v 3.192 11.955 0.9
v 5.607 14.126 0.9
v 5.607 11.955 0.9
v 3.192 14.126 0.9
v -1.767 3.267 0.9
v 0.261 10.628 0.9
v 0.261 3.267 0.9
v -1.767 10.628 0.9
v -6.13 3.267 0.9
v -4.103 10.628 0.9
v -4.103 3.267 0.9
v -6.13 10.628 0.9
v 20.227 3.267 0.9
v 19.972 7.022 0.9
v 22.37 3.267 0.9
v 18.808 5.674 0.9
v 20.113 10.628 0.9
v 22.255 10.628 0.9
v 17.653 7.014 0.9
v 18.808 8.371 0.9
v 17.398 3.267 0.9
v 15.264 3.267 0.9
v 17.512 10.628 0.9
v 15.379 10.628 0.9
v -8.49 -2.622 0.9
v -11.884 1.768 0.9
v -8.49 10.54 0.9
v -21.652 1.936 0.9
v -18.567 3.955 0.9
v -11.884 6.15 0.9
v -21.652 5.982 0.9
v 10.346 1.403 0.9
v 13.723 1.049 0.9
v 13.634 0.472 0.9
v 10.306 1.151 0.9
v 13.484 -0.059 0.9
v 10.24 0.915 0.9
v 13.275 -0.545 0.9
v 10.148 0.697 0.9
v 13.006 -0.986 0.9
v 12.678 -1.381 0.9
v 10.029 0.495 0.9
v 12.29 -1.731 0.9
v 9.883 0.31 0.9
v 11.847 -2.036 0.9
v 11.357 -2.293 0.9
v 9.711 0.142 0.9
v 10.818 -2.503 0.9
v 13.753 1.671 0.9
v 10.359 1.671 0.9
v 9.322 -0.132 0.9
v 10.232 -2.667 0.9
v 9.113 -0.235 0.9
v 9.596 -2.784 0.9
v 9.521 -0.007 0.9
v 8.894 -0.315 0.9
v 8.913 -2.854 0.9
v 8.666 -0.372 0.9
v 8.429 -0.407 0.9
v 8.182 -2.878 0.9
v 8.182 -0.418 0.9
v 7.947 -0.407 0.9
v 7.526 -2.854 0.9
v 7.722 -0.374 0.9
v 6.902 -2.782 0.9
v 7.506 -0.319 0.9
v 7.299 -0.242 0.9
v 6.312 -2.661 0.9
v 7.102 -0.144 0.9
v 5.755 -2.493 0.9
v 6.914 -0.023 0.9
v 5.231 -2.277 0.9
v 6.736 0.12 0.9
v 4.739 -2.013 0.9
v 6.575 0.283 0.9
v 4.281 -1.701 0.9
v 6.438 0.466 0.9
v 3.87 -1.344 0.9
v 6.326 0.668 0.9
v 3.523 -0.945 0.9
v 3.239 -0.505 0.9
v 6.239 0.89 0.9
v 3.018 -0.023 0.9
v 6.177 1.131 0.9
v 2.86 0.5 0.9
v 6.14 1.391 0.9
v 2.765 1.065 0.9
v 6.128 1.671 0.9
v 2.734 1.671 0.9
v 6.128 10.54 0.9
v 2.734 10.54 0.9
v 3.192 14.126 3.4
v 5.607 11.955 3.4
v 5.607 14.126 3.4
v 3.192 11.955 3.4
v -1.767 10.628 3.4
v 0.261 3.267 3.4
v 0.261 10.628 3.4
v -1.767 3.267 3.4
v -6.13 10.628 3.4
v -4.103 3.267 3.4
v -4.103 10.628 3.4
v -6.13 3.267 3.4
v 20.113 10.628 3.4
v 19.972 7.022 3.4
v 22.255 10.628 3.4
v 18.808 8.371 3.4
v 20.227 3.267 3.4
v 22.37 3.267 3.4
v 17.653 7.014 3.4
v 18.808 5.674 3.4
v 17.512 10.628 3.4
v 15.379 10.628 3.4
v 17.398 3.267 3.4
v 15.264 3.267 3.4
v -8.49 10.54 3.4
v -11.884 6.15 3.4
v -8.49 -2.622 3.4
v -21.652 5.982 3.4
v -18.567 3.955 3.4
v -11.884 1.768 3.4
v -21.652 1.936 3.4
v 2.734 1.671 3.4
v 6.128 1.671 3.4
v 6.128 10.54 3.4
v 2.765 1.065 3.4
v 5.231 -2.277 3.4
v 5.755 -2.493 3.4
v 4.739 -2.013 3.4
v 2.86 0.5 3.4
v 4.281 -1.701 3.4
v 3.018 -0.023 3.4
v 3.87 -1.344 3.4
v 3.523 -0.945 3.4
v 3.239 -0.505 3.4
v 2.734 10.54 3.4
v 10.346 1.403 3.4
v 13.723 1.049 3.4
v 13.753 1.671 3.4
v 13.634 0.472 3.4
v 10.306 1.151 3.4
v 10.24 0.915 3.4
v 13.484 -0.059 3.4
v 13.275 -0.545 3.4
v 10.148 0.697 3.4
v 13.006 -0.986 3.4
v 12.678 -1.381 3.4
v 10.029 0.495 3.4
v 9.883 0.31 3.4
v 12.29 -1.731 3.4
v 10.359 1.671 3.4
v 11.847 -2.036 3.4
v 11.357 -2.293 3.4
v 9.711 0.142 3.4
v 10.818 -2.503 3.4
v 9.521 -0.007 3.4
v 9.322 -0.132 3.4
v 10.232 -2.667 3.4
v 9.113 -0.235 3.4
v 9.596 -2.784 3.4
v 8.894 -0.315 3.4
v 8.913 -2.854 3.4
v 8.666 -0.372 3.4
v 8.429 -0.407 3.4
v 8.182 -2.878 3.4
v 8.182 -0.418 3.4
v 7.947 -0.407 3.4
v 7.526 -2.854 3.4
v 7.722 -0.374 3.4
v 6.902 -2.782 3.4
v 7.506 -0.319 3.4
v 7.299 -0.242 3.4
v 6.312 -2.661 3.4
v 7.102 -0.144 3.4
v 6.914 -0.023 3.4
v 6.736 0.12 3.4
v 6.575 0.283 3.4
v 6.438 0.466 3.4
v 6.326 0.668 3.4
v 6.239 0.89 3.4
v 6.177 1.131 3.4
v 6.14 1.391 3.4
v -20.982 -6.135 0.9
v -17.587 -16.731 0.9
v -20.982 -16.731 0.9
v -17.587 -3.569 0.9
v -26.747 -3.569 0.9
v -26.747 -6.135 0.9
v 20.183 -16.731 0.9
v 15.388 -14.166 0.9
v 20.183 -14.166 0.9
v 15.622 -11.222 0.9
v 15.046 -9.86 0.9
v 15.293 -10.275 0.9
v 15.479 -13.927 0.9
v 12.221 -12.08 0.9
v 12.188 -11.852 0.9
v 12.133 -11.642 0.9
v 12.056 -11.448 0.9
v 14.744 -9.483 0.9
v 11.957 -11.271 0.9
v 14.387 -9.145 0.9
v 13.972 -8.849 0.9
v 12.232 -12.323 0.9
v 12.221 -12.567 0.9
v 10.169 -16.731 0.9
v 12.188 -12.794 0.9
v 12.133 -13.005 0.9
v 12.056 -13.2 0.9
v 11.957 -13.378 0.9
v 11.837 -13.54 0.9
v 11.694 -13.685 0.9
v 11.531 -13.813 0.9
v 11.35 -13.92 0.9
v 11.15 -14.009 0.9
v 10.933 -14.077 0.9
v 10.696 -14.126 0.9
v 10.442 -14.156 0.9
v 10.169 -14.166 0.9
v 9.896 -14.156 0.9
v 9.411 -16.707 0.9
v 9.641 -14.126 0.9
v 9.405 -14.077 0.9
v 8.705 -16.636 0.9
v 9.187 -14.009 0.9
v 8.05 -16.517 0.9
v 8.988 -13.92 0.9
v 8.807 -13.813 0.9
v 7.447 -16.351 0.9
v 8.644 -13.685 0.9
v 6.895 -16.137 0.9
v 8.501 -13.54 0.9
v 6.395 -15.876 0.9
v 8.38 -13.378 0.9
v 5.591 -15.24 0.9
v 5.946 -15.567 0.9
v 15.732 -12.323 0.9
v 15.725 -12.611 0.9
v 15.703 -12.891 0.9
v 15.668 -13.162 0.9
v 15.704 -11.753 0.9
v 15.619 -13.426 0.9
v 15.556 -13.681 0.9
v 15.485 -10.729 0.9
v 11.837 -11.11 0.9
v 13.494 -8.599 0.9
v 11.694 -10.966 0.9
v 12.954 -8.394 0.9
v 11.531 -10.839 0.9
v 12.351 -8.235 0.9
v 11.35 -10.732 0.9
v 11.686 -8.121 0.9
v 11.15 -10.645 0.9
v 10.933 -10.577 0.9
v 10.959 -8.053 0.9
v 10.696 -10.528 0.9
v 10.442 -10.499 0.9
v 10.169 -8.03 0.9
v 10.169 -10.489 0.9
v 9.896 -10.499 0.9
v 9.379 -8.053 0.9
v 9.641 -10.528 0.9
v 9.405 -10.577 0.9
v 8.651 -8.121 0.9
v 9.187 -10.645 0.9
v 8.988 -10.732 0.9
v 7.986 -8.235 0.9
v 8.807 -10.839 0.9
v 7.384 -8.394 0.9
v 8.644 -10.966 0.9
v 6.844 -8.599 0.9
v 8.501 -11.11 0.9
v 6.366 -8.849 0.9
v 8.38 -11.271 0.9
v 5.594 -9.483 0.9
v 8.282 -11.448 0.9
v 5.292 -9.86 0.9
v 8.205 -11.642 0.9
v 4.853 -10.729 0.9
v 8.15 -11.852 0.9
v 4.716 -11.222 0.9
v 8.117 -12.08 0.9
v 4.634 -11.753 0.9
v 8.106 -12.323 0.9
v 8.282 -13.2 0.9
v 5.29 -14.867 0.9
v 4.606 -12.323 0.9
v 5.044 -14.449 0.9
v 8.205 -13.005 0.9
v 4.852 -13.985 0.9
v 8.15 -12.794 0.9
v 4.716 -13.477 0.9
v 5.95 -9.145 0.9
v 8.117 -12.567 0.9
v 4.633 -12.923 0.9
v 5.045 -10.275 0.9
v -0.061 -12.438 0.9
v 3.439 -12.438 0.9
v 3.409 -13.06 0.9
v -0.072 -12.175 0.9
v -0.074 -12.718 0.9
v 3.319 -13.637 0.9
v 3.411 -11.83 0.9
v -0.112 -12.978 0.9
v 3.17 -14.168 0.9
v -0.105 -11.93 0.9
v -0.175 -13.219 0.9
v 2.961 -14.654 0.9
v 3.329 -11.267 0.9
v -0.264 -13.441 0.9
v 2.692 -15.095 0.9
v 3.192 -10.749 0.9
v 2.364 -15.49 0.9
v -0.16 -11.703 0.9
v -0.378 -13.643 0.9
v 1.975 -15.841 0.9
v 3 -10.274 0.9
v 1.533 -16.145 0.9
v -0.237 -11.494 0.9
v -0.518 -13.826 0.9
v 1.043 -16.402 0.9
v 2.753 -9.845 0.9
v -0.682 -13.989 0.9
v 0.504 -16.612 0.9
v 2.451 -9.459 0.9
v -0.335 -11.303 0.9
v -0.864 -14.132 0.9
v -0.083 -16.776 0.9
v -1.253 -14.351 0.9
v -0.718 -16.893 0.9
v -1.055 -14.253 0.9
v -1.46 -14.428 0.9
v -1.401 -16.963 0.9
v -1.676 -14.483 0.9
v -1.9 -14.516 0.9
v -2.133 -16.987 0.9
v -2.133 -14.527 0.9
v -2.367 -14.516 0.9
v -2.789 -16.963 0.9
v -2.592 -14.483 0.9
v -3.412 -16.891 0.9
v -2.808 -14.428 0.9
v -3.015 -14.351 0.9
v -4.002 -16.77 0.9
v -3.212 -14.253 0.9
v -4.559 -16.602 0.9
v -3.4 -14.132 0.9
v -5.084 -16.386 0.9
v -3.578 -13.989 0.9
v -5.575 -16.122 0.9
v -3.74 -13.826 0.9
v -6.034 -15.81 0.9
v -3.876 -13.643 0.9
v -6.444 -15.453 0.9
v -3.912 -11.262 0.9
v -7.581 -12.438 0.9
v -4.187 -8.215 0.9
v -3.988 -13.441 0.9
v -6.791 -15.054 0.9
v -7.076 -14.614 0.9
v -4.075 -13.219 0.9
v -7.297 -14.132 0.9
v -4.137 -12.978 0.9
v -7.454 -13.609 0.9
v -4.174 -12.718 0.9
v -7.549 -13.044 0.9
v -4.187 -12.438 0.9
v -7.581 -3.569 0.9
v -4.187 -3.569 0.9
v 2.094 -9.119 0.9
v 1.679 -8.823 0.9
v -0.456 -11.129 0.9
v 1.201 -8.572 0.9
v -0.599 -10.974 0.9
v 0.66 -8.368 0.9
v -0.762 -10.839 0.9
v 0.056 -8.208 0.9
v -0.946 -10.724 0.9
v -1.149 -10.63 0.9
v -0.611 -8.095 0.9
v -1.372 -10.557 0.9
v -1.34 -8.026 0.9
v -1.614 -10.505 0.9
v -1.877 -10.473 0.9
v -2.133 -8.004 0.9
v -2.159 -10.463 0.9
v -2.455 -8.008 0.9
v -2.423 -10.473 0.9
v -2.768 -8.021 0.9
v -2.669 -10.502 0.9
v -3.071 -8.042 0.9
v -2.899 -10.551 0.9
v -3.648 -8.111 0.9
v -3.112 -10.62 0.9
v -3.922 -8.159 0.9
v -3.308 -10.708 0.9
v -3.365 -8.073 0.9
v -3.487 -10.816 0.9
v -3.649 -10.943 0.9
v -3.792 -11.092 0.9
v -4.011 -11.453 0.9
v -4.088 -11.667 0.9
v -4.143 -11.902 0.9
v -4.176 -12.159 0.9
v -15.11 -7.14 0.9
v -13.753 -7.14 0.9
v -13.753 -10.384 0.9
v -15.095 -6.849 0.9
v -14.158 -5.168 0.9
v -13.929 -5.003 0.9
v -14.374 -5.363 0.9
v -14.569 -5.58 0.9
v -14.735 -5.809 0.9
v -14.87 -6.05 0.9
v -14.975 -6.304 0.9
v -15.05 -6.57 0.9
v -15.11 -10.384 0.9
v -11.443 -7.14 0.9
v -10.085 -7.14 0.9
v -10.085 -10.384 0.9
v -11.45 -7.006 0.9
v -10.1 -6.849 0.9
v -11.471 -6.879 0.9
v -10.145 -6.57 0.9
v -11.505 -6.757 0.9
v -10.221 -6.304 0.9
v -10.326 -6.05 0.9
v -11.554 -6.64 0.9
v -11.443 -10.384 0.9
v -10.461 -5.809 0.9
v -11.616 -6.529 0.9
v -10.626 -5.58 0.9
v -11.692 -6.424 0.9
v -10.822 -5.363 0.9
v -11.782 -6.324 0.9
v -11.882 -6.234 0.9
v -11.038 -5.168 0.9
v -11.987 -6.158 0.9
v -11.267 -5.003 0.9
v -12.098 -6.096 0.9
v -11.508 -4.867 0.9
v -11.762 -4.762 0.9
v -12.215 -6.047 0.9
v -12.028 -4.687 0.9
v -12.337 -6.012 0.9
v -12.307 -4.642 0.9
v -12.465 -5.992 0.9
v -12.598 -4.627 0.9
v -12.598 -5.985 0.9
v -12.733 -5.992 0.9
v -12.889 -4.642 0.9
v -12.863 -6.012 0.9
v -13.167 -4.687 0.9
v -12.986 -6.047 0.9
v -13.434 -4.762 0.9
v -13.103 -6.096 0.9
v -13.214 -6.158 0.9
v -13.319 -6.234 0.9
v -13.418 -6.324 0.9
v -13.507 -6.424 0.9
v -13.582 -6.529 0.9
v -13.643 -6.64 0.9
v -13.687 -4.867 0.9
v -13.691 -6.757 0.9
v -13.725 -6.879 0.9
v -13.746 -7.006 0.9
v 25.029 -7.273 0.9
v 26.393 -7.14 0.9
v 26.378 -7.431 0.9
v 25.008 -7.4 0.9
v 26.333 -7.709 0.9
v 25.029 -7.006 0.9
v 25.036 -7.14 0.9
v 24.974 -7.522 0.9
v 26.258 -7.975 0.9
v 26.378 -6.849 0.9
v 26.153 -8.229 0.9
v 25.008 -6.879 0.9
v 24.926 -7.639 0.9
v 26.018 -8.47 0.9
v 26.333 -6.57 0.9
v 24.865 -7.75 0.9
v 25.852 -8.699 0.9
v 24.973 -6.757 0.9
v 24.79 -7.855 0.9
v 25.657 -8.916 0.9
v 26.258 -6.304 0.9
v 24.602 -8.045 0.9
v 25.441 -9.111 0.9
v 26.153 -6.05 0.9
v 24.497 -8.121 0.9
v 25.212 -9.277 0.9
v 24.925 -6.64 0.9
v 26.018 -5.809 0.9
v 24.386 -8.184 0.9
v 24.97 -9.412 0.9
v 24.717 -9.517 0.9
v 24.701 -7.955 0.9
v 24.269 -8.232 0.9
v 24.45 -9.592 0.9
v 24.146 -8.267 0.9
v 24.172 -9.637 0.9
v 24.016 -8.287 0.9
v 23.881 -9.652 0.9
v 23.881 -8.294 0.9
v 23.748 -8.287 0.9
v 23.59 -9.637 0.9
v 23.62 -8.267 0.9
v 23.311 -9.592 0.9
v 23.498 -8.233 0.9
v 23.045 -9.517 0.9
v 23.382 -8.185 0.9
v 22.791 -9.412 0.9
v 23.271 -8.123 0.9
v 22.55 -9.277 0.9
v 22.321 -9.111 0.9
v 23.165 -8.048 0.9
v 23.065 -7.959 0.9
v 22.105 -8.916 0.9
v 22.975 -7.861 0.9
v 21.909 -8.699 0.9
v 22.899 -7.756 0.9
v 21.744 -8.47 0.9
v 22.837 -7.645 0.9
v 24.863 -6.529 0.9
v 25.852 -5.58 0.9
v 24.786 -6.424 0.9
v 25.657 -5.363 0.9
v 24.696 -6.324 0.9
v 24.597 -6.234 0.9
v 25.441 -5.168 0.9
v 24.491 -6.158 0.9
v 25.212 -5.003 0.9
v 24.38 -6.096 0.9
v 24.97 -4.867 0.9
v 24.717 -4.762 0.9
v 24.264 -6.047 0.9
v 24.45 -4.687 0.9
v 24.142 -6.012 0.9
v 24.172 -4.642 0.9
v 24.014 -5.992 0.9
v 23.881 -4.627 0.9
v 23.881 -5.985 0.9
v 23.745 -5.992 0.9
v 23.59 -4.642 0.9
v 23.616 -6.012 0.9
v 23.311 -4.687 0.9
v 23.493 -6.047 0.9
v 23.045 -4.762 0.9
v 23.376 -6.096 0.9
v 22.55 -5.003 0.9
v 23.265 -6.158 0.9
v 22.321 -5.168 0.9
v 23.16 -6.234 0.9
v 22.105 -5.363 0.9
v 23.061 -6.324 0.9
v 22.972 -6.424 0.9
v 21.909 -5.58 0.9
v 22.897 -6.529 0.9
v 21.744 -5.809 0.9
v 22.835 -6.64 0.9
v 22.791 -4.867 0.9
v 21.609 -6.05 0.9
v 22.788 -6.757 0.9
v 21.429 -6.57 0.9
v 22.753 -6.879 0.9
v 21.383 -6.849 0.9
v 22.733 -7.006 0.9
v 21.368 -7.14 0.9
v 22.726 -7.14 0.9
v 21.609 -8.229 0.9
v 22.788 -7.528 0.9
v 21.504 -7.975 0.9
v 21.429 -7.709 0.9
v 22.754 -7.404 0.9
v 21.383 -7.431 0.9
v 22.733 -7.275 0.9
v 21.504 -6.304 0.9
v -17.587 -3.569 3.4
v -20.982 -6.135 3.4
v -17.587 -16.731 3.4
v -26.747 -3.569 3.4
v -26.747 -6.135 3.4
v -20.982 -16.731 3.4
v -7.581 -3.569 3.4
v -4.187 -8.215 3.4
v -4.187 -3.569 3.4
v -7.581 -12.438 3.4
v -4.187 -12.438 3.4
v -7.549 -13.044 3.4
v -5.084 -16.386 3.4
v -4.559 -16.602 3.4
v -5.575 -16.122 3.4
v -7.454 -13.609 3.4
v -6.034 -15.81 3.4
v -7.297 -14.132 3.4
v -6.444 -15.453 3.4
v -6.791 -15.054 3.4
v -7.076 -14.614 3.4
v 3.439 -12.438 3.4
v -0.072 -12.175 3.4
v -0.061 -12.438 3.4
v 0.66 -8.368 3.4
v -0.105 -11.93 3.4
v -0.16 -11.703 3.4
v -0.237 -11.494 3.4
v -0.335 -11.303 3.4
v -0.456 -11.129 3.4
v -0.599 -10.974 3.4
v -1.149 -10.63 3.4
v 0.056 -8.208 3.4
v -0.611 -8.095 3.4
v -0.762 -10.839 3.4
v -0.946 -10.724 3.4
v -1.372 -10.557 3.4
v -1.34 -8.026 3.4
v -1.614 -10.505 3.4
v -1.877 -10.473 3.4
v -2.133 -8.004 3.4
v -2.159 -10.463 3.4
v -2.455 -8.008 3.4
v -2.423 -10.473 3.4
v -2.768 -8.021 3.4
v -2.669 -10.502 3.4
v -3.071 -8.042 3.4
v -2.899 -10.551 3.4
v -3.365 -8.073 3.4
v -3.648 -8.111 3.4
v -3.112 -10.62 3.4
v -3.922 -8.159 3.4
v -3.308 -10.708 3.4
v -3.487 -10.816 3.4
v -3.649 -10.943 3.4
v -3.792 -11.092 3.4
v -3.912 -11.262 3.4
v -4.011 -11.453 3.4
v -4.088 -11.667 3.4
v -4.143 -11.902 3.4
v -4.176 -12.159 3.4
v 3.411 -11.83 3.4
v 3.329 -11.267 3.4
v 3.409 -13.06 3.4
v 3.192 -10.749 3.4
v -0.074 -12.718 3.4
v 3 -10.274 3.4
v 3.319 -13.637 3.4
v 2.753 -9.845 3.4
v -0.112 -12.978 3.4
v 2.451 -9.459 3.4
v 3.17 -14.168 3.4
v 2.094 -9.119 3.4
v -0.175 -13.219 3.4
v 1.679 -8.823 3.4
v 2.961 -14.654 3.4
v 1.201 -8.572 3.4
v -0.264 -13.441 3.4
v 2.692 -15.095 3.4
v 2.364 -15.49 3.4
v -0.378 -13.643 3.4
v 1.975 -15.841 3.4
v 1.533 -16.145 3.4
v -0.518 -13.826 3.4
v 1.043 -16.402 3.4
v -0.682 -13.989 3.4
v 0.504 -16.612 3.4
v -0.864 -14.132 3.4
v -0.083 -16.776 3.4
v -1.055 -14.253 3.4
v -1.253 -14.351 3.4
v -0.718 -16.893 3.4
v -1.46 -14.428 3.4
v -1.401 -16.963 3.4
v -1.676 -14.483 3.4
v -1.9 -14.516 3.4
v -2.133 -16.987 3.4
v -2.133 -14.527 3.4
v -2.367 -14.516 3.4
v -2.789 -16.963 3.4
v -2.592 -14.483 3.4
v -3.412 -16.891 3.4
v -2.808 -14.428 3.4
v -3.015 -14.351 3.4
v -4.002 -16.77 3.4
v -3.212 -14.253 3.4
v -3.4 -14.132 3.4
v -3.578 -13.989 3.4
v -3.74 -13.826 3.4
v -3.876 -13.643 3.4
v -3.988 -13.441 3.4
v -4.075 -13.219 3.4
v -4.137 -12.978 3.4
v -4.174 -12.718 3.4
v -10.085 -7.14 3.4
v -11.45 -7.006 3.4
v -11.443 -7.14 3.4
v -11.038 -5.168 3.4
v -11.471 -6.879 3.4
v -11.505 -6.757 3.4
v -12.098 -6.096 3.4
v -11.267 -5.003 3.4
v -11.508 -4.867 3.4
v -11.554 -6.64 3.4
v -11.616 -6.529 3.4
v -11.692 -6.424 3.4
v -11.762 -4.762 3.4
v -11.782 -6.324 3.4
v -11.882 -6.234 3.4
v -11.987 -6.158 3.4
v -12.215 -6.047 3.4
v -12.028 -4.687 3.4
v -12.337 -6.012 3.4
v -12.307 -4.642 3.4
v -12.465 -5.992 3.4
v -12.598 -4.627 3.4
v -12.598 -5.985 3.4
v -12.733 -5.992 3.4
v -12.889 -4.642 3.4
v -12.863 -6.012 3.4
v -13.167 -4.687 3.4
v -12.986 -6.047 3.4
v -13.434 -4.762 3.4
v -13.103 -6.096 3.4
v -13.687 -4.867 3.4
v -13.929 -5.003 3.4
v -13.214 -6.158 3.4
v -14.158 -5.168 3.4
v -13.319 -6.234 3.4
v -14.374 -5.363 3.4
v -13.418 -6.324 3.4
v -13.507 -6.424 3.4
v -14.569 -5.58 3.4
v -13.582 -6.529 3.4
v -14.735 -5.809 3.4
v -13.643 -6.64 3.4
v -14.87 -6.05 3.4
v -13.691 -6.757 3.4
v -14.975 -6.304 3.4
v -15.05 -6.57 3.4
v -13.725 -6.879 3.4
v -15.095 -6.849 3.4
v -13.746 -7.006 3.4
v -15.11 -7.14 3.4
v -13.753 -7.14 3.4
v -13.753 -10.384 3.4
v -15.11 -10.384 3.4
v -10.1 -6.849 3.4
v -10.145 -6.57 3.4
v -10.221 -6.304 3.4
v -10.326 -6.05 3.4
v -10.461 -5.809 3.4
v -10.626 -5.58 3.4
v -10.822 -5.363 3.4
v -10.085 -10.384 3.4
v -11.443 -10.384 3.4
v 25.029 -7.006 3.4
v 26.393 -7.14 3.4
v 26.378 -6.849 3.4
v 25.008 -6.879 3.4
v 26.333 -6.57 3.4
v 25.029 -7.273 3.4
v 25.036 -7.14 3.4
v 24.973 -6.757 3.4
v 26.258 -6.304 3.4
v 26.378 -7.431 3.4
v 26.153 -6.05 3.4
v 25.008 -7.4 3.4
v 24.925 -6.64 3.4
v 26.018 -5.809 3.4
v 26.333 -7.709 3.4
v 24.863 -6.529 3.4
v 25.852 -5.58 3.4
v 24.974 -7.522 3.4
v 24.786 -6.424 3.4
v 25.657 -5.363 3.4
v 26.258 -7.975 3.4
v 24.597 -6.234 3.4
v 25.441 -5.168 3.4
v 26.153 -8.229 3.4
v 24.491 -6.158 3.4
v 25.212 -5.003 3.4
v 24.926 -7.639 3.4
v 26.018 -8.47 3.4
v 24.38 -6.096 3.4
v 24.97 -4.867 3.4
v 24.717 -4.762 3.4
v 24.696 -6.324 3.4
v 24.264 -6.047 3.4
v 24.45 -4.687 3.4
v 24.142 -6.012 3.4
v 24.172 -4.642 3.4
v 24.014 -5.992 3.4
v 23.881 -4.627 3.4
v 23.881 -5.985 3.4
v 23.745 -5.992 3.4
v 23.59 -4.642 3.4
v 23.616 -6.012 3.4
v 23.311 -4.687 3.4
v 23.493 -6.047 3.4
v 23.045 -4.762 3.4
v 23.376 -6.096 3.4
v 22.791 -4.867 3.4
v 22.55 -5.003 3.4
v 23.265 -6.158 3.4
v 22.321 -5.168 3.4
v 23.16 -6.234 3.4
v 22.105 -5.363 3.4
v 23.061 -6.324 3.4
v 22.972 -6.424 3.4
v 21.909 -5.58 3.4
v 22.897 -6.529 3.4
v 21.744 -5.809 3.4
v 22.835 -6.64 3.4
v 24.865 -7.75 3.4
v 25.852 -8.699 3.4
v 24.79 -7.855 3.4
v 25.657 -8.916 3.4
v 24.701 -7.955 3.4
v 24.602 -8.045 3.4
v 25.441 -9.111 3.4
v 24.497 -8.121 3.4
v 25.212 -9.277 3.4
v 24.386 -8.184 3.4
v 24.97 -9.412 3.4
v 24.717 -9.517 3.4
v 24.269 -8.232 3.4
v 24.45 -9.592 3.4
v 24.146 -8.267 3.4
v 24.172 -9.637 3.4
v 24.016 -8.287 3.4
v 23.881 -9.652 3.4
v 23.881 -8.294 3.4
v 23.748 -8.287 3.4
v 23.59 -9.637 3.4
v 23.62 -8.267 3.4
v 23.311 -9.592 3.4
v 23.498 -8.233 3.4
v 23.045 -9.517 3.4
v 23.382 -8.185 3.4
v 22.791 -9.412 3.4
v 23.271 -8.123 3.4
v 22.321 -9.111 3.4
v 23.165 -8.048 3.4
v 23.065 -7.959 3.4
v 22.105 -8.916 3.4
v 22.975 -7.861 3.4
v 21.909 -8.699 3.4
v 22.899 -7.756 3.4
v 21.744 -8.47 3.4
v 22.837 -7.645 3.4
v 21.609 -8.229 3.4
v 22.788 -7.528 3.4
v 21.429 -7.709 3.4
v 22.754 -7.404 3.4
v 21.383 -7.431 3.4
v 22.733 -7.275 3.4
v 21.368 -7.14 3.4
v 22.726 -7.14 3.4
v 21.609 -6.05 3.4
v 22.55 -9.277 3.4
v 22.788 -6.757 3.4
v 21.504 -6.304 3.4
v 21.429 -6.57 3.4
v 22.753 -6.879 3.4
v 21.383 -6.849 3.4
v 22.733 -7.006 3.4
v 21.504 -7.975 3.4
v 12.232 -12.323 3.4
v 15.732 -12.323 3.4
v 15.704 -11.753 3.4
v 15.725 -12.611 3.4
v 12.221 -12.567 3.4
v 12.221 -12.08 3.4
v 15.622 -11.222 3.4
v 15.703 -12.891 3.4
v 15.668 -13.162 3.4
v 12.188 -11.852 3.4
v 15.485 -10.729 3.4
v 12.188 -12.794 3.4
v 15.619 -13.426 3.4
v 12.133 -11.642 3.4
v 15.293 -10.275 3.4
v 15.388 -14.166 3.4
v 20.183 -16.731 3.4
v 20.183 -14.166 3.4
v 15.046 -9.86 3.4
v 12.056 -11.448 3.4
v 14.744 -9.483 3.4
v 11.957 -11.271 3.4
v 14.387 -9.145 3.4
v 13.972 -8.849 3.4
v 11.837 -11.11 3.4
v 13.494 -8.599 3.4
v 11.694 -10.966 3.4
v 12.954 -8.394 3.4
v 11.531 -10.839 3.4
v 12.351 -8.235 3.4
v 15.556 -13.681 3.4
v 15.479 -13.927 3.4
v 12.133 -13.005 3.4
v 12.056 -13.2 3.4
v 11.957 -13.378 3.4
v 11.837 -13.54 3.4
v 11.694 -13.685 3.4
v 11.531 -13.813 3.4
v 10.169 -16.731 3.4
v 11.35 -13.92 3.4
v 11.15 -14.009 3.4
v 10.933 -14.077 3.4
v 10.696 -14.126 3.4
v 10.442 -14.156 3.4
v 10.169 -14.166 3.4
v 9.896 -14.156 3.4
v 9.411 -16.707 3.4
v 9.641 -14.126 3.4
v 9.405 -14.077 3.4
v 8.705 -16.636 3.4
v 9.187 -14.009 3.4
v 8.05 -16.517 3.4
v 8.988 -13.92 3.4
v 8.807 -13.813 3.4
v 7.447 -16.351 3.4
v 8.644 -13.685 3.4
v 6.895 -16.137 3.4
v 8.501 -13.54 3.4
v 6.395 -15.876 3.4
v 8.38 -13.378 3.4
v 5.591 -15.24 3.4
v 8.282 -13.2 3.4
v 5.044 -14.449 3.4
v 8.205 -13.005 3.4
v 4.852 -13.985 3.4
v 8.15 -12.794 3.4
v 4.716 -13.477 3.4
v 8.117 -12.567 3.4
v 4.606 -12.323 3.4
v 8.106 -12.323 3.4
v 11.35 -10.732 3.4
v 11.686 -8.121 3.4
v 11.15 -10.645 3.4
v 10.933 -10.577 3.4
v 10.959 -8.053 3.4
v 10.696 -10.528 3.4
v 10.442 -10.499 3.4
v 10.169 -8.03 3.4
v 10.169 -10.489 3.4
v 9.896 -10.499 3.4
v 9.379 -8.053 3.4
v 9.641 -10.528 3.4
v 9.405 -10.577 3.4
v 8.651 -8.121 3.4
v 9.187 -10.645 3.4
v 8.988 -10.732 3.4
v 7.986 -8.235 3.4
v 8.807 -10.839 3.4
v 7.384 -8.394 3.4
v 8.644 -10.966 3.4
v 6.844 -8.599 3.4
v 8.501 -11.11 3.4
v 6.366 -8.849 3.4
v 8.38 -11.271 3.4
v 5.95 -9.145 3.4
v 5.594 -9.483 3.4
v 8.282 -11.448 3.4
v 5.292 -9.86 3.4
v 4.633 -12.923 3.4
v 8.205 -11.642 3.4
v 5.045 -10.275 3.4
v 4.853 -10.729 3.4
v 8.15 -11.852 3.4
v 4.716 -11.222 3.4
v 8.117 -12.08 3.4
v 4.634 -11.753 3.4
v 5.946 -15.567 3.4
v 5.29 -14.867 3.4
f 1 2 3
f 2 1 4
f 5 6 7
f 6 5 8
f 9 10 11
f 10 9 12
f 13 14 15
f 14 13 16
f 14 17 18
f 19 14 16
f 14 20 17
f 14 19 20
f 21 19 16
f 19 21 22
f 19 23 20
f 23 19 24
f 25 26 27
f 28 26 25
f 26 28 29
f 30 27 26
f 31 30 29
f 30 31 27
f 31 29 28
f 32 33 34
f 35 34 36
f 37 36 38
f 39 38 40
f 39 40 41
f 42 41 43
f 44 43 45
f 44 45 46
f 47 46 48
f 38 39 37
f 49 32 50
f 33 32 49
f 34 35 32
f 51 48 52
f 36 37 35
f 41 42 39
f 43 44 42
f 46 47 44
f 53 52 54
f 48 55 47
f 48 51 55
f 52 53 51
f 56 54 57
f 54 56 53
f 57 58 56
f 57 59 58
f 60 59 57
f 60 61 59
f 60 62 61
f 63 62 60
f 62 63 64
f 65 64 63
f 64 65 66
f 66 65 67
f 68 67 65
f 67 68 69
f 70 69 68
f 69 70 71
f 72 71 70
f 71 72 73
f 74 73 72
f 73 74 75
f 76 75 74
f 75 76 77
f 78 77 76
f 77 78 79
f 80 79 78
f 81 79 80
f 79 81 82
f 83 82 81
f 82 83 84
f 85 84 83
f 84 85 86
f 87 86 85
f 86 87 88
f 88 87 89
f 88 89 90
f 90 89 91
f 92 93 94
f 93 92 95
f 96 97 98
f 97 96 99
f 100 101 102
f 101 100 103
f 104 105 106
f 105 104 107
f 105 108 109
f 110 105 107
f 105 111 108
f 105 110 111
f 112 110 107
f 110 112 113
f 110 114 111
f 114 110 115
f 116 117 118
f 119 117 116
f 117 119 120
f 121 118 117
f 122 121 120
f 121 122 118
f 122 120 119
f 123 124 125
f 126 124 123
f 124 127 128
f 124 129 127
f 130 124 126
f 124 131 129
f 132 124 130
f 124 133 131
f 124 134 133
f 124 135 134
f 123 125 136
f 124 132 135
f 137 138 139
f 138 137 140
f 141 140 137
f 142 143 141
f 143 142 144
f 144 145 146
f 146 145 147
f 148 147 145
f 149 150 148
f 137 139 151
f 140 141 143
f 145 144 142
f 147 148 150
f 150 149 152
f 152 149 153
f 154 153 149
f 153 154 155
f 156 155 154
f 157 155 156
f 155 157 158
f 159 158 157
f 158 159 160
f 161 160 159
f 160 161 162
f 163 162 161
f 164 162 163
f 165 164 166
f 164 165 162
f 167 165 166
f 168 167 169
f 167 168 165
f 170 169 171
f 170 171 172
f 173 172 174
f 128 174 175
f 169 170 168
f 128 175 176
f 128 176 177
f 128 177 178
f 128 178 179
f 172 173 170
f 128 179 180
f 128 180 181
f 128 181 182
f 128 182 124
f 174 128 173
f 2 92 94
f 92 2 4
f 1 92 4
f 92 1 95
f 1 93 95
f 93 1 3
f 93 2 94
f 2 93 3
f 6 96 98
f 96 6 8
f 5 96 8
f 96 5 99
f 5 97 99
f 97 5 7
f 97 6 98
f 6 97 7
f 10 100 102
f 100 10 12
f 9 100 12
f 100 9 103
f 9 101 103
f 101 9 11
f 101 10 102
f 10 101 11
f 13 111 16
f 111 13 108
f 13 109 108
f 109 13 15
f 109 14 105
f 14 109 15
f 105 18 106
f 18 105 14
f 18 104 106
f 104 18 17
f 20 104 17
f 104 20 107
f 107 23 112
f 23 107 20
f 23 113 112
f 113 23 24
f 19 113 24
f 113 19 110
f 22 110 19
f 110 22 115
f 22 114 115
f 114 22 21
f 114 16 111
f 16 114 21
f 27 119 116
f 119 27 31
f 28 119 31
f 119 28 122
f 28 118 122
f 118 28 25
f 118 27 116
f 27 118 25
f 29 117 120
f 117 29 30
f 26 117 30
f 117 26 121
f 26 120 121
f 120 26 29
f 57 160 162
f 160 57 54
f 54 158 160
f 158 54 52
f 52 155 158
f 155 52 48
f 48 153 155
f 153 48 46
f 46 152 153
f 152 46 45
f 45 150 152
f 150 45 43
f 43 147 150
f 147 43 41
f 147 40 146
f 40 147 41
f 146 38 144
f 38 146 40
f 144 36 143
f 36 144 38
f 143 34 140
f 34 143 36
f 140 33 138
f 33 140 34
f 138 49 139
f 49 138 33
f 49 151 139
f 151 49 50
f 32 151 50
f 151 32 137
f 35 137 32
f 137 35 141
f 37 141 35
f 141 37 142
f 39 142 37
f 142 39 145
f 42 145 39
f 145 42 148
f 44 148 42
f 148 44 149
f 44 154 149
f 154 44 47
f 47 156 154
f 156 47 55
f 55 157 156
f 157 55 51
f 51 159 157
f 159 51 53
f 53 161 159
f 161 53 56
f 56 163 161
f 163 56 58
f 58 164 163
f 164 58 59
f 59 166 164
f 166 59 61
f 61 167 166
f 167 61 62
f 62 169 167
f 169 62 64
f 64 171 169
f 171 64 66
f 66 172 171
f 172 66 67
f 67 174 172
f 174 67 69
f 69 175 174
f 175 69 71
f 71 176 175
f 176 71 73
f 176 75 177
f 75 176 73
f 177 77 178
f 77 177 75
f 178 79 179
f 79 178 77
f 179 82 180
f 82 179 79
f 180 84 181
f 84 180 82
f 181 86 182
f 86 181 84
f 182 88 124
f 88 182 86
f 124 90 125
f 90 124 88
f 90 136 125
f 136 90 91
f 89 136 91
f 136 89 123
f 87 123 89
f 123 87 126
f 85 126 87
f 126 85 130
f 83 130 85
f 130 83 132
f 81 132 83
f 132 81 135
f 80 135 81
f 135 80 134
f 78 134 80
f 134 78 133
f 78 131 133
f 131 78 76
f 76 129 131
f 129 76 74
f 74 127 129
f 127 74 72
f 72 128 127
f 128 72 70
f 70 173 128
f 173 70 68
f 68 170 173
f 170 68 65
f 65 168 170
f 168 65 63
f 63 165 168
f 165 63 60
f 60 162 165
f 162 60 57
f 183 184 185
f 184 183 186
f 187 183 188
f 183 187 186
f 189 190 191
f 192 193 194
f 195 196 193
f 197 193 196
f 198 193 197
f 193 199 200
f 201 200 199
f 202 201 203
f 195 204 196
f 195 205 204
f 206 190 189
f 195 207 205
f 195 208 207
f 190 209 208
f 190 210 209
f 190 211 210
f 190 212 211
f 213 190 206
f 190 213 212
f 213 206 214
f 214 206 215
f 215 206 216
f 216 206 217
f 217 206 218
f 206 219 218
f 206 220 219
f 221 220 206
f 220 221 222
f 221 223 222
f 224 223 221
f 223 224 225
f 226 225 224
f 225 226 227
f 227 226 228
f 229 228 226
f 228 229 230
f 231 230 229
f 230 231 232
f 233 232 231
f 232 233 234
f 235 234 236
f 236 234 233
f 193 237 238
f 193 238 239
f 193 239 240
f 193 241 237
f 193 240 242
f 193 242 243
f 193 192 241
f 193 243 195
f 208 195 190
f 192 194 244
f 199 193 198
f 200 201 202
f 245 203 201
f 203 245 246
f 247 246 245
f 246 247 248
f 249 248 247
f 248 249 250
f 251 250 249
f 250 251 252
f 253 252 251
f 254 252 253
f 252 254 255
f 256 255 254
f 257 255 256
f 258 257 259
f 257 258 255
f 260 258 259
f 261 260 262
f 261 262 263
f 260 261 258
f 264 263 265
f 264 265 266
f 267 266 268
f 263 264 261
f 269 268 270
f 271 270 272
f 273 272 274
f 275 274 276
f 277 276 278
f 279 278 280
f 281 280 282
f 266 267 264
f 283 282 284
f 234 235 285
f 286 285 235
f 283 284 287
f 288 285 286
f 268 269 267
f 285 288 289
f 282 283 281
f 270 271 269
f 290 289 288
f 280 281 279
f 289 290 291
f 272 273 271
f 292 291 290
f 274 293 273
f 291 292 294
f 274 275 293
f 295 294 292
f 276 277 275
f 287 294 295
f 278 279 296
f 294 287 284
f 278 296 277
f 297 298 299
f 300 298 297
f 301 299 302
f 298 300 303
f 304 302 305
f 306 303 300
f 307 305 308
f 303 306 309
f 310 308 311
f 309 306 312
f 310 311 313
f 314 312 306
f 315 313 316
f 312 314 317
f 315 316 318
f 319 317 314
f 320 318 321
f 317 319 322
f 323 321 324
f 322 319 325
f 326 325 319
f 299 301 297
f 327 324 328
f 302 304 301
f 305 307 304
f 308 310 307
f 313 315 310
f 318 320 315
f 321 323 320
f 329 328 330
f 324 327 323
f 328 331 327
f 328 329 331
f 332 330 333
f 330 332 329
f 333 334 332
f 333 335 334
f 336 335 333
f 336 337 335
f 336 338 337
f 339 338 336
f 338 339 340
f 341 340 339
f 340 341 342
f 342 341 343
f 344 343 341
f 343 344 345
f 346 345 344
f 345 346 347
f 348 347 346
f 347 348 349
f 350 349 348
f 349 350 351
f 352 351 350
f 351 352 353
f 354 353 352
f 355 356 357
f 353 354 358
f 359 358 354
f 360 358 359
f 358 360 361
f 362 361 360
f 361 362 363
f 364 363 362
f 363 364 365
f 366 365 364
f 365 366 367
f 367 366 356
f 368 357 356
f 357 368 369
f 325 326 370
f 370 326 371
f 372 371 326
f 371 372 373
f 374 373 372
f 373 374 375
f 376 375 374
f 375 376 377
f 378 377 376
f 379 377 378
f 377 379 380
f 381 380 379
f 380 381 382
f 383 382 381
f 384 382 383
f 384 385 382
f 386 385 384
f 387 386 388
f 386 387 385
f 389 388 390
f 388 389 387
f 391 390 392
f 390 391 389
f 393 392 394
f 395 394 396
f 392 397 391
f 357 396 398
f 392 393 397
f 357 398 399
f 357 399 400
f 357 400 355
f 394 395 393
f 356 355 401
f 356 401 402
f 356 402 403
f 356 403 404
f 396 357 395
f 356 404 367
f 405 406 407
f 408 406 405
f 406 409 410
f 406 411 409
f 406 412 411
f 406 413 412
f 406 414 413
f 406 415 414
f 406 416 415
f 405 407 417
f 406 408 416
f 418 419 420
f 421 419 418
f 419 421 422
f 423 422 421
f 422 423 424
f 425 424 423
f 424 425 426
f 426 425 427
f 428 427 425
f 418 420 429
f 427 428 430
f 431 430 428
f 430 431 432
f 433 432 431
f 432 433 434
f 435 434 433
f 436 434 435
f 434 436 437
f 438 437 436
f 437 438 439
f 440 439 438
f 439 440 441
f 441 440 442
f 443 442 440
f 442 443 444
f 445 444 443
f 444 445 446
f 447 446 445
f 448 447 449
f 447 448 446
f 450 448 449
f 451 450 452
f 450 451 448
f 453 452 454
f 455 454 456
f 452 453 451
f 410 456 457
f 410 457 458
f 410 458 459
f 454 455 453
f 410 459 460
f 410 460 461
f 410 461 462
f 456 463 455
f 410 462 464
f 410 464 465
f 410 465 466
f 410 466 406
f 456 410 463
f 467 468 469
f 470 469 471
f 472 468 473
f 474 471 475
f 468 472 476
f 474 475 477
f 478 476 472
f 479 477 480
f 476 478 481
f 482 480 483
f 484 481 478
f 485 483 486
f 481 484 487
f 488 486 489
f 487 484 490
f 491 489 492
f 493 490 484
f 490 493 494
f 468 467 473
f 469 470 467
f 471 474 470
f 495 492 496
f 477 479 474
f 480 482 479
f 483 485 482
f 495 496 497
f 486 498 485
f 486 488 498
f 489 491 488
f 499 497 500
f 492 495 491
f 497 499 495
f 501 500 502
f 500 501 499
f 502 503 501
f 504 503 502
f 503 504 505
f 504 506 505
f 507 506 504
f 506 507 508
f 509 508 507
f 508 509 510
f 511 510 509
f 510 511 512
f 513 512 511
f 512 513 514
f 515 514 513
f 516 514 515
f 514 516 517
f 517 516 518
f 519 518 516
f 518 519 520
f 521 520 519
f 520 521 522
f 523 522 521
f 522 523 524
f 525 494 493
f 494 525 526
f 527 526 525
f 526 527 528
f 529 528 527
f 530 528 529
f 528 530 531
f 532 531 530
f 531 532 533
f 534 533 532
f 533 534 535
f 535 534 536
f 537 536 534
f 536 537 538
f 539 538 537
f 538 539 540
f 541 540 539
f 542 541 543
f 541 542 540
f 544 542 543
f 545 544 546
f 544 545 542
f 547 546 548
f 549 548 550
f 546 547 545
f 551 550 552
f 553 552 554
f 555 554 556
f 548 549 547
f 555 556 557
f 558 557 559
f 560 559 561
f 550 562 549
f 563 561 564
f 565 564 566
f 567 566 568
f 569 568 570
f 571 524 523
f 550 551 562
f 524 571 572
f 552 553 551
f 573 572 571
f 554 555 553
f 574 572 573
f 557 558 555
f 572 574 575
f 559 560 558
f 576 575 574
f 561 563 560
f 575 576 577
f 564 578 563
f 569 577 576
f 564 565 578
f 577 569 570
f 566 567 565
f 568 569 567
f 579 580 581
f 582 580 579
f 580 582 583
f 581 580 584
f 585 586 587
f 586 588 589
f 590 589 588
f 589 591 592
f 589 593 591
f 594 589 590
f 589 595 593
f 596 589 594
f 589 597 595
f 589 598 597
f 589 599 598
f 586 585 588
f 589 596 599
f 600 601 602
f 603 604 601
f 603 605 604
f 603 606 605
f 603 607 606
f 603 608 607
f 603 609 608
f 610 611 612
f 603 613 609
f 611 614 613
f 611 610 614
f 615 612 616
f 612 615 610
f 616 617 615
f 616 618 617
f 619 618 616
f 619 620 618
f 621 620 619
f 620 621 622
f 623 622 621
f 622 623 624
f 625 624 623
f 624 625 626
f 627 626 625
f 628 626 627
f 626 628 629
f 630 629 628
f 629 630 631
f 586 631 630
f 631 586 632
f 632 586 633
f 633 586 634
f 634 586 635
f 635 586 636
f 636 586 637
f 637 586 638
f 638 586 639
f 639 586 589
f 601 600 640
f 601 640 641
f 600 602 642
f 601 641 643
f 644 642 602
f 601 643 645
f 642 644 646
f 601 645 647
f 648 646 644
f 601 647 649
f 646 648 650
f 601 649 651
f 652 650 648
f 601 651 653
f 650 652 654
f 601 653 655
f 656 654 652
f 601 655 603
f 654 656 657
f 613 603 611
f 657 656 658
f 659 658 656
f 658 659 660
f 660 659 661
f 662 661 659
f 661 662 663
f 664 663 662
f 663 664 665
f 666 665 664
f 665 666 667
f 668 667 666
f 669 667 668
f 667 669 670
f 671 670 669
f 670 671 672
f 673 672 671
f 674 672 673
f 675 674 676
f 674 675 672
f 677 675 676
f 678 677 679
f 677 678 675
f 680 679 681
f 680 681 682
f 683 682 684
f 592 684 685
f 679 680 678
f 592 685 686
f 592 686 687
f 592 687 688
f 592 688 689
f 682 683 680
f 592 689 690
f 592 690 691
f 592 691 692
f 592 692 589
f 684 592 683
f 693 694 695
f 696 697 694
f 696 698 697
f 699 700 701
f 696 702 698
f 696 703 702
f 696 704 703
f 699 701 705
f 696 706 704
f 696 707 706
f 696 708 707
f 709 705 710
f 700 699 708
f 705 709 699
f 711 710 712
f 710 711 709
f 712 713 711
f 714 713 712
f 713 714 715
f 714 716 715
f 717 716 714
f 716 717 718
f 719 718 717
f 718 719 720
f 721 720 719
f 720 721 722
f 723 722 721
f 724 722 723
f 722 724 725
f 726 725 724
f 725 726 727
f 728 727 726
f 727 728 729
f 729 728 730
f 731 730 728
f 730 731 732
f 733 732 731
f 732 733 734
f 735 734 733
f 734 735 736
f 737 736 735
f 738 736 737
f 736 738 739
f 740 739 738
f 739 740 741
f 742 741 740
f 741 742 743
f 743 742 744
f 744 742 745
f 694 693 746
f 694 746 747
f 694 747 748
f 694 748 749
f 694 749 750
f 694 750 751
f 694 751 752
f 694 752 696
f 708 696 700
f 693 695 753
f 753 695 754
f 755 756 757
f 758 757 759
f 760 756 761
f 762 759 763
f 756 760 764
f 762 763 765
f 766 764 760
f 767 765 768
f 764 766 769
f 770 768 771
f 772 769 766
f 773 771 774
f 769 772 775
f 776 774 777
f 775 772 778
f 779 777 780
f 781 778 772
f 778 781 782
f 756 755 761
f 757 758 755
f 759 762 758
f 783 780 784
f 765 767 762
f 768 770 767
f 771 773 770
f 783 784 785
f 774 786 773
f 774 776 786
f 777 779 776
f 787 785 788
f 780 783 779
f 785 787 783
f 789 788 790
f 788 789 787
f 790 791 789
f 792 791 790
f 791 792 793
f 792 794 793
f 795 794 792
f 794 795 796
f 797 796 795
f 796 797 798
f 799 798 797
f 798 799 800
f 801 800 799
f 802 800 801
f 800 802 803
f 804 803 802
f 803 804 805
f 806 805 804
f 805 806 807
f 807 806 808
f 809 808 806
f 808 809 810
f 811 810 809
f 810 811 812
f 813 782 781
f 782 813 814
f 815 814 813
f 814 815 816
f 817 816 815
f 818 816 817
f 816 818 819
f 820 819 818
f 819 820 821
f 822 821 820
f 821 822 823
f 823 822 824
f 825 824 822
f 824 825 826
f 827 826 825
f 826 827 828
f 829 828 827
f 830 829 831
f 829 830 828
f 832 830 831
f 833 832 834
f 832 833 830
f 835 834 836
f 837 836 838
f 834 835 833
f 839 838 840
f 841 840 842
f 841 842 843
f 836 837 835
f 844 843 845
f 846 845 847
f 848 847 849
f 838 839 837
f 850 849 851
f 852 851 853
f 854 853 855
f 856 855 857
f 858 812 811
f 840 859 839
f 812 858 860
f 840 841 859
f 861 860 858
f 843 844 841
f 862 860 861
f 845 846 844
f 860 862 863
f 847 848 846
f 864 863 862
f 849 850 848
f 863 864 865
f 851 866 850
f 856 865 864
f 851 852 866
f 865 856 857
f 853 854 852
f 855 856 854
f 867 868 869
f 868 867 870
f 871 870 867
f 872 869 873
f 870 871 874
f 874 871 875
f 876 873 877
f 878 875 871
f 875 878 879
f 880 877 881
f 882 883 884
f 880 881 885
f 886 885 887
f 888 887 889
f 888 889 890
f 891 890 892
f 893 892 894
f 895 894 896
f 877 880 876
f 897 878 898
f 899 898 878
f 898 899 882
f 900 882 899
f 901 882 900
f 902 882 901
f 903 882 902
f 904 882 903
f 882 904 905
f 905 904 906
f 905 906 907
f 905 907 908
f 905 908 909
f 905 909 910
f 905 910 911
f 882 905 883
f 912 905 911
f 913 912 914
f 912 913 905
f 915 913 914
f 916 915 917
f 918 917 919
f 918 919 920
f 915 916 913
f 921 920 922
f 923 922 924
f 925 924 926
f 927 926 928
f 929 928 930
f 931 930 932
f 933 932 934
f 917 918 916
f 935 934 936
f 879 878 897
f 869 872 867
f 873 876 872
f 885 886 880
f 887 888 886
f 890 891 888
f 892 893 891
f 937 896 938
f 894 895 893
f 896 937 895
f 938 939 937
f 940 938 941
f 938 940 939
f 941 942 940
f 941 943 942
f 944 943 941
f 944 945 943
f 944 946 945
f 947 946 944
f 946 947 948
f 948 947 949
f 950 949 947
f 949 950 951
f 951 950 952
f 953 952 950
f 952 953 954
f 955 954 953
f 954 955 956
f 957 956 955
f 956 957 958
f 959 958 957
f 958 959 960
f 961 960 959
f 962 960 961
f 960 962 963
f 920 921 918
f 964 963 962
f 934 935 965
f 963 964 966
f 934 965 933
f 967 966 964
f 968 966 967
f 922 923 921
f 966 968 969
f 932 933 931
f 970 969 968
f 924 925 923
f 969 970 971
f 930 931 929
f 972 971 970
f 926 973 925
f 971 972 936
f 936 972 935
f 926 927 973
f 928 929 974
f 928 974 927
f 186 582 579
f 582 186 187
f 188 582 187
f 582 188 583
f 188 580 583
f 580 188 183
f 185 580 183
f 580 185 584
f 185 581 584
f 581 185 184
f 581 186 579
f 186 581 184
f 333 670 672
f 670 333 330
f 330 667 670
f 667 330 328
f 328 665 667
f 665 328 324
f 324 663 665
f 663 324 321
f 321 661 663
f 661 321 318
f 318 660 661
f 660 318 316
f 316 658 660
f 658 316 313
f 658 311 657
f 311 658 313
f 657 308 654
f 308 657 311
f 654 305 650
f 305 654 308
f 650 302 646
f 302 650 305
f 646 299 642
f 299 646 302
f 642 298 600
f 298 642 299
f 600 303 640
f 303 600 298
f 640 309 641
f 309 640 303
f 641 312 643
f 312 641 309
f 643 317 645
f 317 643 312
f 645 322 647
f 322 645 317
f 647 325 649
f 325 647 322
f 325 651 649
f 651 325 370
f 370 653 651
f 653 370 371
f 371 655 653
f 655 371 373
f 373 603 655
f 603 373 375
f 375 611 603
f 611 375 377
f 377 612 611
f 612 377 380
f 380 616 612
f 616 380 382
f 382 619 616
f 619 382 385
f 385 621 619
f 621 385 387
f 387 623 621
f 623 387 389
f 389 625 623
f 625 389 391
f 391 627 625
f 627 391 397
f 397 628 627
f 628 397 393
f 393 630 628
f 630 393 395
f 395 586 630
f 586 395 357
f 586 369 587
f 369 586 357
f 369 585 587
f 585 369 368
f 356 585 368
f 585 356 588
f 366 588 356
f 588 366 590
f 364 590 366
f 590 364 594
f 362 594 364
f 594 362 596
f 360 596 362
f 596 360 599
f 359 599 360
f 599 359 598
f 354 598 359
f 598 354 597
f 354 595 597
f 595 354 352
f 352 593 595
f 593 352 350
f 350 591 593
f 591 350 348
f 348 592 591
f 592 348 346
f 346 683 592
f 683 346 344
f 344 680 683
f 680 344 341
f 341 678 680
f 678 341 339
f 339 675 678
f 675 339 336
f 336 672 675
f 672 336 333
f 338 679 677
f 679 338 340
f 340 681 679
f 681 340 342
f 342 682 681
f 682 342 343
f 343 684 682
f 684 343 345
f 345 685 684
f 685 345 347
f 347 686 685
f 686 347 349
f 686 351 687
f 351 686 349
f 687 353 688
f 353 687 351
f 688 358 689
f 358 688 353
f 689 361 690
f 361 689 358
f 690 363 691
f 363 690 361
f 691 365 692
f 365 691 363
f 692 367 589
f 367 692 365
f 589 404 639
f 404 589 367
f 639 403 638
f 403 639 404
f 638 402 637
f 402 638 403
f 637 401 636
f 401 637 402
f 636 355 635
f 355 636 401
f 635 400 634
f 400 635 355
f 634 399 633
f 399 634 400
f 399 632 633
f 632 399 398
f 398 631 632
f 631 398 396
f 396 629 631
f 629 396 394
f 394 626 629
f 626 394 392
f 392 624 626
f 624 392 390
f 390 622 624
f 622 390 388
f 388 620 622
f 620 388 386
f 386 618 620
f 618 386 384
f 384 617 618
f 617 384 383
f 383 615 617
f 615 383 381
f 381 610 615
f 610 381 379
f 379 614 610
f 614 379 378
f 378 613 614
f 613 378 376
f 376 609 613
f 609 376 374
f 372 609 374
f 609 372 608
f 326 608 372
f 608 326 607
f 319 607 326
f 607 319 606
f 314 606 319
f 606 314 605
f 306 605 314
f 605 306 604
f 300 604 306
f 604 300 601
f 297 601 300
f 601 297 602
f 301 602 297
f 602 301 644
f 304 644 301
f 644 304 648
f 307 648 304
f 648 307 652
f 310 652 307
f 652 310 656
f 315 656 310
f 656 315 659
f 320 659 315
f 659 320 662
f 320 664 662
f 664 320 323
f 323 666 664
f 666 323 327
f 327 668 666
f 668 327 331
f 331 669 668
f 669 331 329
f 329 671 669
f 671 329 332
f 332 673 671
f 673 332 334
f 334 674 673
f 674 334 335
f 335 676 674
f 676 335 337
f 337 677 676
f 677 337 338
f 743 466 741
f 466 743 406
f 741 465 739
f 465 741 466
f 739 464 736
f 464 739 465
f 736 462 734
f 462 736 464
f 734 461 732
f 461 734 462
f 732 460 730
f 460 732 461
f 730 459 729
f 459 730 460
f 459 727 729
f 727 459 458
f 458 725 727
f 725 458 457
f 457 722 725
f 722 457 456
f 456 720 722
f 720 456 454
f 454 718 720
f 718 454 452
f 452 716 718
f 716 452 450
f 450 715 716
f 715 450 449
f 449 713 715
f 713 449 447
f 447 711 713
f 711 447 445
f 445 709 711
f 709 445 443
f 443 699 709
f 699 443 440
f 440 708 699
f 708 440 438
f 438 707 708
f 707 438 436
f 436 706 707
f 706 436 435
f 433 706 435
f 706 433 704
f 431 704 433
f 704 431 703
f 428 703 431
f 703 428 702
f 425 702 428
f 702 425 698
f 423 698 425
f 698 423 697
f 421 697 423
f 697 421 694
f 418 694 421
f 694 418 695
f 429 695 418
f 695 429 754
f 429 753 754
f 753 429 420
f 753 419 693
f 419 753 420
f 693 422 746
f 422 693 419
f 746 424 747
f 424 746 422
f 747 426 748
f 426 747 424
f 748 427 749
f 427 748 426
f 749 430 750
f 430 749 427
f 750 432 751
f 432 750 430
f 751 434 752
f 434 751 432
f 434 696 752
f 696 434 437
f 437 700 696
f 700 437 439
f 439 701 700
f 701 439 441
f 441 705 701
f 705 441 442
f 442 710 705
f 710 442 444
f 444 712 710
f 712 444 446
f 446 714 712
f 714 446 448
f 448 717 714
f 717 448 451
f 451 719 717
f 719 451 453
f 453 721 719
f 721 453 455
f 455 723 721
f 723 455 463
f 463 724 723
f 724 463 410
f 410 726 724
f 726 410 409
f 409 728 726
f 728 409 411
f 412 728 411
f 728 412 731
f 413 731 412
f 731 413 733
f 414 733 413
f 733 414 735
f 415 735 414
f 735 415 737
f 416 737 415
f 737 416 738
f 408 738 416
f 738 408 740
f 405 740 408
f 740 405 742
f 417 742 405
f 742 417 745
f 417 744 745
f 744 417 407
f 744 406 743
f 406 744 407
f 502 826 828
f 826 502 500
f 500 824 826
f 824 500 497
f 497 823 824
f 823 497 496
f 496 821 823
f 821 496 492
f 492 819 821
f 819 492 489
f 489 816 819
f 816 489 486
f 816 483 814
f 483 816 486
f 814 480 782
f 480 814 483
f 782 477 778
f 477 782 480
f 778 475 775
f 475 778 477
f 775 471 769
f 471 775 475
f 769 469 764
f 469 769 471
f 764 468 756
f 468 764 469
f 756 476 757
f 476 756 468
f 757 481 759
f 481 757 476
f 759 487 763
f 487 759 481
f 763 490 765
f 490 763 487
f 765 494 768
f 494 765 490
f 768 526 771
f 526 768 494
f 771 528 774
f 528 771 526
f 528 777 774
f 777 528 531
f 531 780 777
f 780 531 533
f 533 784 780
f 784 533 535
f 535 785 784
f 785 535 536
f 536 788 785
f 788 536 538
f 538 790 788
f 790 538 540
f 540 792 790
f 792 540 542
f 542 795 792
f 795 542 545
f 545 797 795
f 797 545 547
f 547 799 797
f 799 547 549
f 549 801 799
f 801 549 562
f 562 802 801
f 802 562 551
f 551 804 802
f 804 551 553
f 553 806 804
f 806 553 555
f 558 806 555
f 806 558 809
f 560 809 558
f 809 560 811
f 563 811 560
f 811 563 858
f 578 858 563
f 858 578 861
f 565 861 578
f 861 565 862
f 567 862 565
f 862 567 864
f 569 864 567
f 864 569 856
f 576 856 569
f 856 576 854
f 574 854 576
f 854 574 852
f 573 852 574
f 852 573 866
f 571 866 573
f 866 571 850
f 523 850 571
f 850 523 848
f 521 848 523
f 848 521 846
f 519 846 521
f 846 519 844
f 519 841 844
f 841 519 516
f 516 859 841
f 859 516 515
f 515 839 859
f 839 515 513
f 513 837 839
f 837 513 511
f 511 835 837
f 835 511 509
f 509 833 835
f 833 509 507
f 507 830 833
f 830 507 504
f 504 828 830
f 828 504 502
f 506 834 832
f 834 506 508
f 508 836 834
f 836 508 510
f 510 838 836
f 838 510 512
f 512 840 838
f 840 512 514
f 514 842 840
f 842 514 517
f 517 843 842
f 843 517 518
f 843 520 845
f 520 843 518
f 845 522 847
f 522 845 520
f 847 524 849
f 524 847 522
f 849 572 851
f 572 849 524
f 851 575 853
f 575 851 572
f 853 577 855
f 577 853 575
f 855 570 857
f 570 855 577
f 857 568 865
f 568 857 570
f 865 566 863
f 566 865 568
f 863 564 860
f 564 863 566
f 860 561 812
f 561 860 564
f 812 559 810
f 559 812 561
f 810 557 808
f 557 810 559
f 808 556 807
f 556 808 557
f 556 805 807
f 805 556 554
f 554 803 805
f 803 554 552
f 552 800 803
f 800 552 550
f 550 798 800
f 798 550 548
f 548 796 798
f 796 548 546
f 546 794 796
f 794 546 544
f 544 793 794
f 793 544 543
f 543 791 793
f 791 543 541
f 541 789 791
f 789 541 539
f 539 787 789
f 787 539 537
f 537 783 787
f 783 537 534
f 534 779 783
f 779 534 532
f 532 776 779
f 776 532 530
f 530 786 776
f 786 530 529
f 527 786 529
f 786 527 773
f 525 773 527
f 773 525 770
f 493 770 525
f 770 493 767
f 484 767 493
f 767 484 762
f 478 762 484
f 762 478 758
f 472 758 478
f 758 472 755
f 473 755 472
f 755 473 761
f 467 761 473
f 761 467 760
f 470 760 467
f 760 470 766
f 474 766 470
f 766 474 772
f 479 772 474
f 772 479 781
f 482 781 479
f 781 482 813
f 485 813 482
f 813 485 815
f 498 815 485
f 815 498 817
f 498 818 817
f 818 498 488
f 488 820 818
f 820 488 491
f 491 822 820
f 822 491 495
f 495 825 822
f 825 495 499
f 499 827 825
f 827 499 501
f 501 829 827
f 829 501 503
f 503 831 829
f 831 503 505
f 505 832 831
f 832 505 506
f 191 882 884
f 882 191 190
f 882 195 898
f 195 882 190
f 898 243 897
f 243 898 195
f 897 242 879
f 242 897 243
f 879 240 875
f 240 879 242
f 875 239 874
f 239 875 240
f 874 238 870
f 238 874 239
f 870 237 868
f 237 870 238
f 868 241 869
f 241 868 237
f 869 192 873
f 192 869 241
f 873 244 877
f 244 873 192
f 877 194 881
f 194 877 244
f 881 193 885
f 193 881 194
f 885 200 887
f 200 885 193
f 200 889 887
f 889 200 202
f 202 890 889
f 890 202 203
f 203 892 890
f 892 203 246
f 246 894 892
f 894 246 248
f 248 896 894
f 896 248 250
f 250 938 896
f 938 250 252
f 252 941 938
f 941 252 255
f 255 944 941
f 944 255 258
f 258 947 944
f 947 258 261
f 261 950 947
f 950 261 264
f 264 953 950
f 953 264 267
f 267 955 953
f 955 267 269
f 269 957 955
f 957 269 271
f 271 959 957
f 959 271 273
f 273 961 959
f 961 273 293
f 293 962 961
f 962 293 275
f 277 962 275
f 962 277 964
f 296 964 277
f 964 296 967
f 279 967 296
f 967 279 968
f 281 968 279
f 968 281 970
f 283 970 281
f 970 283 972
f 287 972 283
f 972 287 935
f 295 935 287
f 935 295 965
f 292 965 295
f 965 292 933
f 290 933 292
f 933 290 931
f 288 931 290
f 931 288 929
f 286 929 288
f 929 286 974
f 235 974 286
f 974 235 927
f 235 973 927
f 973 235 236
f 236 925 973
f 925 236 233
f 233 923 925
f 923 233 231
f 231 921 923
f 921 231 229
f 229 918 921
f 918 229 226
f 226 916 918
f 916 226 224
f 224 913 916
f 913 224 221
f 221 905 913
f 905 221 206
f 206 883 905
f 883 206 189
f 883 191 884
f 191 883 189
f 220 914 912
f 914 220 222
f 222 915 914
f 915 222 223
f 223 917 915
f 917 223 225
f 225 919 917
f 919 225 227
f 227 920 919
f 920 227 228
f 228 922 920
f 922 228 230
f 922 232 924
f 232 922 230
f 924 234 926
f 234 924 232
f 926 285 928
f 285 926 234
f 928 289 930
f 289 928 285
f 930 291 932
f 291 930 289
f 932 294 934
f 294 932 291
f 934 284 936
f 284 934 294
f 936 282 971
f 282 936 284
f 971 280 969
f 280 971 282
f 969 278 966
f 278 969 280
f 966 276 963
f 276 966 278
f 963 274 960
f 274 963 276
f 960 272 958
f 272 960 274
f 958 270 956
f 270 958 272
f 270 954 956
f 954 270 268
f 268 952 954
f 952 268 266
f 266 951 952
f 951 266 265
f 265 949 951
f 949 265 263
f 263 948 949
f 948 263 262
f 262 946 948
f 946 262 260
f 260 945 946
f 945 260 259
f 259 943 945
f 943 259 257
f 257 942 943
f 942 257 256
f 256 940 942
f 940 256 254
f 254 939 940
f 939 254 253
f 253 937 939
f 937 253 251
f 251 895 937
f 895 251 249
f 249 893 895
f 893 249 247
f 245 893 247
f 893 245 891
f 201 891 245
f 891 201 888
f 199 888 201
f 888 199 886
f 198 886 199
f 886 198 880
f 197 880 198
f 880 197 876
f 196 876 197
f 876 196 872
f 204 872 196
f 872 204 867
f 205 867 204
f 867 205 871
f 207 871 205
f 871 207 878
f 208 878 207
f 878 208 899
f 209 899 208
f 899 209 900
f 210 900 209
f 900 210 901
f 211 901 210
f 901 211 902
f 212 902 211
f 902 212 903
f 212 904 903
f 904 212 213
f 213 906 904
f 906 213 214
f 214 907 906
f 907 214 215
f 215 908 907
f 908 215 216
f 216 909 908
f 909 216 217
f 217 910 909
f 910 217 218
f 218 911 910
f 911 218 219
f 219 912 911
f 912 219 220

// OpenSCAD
$fn = 48;
  // syllabics (overlaid on icon, tallest)
  translate([0, 5.430, 0.900]) linear_extrude(height=2.500) text("ᐊᐦᒑᕽ", size=13.000, halign="center", valign="center", font="Euphemia UCAS:style=Bold");
  translate([0, -10.430, 0.900]) linear_extrude(height=2.500) text("ᒣᐢᑲᓇᐤ", size=13.000, halign="center", valign="center", font="Euphemia UCAS:style=Bold");
